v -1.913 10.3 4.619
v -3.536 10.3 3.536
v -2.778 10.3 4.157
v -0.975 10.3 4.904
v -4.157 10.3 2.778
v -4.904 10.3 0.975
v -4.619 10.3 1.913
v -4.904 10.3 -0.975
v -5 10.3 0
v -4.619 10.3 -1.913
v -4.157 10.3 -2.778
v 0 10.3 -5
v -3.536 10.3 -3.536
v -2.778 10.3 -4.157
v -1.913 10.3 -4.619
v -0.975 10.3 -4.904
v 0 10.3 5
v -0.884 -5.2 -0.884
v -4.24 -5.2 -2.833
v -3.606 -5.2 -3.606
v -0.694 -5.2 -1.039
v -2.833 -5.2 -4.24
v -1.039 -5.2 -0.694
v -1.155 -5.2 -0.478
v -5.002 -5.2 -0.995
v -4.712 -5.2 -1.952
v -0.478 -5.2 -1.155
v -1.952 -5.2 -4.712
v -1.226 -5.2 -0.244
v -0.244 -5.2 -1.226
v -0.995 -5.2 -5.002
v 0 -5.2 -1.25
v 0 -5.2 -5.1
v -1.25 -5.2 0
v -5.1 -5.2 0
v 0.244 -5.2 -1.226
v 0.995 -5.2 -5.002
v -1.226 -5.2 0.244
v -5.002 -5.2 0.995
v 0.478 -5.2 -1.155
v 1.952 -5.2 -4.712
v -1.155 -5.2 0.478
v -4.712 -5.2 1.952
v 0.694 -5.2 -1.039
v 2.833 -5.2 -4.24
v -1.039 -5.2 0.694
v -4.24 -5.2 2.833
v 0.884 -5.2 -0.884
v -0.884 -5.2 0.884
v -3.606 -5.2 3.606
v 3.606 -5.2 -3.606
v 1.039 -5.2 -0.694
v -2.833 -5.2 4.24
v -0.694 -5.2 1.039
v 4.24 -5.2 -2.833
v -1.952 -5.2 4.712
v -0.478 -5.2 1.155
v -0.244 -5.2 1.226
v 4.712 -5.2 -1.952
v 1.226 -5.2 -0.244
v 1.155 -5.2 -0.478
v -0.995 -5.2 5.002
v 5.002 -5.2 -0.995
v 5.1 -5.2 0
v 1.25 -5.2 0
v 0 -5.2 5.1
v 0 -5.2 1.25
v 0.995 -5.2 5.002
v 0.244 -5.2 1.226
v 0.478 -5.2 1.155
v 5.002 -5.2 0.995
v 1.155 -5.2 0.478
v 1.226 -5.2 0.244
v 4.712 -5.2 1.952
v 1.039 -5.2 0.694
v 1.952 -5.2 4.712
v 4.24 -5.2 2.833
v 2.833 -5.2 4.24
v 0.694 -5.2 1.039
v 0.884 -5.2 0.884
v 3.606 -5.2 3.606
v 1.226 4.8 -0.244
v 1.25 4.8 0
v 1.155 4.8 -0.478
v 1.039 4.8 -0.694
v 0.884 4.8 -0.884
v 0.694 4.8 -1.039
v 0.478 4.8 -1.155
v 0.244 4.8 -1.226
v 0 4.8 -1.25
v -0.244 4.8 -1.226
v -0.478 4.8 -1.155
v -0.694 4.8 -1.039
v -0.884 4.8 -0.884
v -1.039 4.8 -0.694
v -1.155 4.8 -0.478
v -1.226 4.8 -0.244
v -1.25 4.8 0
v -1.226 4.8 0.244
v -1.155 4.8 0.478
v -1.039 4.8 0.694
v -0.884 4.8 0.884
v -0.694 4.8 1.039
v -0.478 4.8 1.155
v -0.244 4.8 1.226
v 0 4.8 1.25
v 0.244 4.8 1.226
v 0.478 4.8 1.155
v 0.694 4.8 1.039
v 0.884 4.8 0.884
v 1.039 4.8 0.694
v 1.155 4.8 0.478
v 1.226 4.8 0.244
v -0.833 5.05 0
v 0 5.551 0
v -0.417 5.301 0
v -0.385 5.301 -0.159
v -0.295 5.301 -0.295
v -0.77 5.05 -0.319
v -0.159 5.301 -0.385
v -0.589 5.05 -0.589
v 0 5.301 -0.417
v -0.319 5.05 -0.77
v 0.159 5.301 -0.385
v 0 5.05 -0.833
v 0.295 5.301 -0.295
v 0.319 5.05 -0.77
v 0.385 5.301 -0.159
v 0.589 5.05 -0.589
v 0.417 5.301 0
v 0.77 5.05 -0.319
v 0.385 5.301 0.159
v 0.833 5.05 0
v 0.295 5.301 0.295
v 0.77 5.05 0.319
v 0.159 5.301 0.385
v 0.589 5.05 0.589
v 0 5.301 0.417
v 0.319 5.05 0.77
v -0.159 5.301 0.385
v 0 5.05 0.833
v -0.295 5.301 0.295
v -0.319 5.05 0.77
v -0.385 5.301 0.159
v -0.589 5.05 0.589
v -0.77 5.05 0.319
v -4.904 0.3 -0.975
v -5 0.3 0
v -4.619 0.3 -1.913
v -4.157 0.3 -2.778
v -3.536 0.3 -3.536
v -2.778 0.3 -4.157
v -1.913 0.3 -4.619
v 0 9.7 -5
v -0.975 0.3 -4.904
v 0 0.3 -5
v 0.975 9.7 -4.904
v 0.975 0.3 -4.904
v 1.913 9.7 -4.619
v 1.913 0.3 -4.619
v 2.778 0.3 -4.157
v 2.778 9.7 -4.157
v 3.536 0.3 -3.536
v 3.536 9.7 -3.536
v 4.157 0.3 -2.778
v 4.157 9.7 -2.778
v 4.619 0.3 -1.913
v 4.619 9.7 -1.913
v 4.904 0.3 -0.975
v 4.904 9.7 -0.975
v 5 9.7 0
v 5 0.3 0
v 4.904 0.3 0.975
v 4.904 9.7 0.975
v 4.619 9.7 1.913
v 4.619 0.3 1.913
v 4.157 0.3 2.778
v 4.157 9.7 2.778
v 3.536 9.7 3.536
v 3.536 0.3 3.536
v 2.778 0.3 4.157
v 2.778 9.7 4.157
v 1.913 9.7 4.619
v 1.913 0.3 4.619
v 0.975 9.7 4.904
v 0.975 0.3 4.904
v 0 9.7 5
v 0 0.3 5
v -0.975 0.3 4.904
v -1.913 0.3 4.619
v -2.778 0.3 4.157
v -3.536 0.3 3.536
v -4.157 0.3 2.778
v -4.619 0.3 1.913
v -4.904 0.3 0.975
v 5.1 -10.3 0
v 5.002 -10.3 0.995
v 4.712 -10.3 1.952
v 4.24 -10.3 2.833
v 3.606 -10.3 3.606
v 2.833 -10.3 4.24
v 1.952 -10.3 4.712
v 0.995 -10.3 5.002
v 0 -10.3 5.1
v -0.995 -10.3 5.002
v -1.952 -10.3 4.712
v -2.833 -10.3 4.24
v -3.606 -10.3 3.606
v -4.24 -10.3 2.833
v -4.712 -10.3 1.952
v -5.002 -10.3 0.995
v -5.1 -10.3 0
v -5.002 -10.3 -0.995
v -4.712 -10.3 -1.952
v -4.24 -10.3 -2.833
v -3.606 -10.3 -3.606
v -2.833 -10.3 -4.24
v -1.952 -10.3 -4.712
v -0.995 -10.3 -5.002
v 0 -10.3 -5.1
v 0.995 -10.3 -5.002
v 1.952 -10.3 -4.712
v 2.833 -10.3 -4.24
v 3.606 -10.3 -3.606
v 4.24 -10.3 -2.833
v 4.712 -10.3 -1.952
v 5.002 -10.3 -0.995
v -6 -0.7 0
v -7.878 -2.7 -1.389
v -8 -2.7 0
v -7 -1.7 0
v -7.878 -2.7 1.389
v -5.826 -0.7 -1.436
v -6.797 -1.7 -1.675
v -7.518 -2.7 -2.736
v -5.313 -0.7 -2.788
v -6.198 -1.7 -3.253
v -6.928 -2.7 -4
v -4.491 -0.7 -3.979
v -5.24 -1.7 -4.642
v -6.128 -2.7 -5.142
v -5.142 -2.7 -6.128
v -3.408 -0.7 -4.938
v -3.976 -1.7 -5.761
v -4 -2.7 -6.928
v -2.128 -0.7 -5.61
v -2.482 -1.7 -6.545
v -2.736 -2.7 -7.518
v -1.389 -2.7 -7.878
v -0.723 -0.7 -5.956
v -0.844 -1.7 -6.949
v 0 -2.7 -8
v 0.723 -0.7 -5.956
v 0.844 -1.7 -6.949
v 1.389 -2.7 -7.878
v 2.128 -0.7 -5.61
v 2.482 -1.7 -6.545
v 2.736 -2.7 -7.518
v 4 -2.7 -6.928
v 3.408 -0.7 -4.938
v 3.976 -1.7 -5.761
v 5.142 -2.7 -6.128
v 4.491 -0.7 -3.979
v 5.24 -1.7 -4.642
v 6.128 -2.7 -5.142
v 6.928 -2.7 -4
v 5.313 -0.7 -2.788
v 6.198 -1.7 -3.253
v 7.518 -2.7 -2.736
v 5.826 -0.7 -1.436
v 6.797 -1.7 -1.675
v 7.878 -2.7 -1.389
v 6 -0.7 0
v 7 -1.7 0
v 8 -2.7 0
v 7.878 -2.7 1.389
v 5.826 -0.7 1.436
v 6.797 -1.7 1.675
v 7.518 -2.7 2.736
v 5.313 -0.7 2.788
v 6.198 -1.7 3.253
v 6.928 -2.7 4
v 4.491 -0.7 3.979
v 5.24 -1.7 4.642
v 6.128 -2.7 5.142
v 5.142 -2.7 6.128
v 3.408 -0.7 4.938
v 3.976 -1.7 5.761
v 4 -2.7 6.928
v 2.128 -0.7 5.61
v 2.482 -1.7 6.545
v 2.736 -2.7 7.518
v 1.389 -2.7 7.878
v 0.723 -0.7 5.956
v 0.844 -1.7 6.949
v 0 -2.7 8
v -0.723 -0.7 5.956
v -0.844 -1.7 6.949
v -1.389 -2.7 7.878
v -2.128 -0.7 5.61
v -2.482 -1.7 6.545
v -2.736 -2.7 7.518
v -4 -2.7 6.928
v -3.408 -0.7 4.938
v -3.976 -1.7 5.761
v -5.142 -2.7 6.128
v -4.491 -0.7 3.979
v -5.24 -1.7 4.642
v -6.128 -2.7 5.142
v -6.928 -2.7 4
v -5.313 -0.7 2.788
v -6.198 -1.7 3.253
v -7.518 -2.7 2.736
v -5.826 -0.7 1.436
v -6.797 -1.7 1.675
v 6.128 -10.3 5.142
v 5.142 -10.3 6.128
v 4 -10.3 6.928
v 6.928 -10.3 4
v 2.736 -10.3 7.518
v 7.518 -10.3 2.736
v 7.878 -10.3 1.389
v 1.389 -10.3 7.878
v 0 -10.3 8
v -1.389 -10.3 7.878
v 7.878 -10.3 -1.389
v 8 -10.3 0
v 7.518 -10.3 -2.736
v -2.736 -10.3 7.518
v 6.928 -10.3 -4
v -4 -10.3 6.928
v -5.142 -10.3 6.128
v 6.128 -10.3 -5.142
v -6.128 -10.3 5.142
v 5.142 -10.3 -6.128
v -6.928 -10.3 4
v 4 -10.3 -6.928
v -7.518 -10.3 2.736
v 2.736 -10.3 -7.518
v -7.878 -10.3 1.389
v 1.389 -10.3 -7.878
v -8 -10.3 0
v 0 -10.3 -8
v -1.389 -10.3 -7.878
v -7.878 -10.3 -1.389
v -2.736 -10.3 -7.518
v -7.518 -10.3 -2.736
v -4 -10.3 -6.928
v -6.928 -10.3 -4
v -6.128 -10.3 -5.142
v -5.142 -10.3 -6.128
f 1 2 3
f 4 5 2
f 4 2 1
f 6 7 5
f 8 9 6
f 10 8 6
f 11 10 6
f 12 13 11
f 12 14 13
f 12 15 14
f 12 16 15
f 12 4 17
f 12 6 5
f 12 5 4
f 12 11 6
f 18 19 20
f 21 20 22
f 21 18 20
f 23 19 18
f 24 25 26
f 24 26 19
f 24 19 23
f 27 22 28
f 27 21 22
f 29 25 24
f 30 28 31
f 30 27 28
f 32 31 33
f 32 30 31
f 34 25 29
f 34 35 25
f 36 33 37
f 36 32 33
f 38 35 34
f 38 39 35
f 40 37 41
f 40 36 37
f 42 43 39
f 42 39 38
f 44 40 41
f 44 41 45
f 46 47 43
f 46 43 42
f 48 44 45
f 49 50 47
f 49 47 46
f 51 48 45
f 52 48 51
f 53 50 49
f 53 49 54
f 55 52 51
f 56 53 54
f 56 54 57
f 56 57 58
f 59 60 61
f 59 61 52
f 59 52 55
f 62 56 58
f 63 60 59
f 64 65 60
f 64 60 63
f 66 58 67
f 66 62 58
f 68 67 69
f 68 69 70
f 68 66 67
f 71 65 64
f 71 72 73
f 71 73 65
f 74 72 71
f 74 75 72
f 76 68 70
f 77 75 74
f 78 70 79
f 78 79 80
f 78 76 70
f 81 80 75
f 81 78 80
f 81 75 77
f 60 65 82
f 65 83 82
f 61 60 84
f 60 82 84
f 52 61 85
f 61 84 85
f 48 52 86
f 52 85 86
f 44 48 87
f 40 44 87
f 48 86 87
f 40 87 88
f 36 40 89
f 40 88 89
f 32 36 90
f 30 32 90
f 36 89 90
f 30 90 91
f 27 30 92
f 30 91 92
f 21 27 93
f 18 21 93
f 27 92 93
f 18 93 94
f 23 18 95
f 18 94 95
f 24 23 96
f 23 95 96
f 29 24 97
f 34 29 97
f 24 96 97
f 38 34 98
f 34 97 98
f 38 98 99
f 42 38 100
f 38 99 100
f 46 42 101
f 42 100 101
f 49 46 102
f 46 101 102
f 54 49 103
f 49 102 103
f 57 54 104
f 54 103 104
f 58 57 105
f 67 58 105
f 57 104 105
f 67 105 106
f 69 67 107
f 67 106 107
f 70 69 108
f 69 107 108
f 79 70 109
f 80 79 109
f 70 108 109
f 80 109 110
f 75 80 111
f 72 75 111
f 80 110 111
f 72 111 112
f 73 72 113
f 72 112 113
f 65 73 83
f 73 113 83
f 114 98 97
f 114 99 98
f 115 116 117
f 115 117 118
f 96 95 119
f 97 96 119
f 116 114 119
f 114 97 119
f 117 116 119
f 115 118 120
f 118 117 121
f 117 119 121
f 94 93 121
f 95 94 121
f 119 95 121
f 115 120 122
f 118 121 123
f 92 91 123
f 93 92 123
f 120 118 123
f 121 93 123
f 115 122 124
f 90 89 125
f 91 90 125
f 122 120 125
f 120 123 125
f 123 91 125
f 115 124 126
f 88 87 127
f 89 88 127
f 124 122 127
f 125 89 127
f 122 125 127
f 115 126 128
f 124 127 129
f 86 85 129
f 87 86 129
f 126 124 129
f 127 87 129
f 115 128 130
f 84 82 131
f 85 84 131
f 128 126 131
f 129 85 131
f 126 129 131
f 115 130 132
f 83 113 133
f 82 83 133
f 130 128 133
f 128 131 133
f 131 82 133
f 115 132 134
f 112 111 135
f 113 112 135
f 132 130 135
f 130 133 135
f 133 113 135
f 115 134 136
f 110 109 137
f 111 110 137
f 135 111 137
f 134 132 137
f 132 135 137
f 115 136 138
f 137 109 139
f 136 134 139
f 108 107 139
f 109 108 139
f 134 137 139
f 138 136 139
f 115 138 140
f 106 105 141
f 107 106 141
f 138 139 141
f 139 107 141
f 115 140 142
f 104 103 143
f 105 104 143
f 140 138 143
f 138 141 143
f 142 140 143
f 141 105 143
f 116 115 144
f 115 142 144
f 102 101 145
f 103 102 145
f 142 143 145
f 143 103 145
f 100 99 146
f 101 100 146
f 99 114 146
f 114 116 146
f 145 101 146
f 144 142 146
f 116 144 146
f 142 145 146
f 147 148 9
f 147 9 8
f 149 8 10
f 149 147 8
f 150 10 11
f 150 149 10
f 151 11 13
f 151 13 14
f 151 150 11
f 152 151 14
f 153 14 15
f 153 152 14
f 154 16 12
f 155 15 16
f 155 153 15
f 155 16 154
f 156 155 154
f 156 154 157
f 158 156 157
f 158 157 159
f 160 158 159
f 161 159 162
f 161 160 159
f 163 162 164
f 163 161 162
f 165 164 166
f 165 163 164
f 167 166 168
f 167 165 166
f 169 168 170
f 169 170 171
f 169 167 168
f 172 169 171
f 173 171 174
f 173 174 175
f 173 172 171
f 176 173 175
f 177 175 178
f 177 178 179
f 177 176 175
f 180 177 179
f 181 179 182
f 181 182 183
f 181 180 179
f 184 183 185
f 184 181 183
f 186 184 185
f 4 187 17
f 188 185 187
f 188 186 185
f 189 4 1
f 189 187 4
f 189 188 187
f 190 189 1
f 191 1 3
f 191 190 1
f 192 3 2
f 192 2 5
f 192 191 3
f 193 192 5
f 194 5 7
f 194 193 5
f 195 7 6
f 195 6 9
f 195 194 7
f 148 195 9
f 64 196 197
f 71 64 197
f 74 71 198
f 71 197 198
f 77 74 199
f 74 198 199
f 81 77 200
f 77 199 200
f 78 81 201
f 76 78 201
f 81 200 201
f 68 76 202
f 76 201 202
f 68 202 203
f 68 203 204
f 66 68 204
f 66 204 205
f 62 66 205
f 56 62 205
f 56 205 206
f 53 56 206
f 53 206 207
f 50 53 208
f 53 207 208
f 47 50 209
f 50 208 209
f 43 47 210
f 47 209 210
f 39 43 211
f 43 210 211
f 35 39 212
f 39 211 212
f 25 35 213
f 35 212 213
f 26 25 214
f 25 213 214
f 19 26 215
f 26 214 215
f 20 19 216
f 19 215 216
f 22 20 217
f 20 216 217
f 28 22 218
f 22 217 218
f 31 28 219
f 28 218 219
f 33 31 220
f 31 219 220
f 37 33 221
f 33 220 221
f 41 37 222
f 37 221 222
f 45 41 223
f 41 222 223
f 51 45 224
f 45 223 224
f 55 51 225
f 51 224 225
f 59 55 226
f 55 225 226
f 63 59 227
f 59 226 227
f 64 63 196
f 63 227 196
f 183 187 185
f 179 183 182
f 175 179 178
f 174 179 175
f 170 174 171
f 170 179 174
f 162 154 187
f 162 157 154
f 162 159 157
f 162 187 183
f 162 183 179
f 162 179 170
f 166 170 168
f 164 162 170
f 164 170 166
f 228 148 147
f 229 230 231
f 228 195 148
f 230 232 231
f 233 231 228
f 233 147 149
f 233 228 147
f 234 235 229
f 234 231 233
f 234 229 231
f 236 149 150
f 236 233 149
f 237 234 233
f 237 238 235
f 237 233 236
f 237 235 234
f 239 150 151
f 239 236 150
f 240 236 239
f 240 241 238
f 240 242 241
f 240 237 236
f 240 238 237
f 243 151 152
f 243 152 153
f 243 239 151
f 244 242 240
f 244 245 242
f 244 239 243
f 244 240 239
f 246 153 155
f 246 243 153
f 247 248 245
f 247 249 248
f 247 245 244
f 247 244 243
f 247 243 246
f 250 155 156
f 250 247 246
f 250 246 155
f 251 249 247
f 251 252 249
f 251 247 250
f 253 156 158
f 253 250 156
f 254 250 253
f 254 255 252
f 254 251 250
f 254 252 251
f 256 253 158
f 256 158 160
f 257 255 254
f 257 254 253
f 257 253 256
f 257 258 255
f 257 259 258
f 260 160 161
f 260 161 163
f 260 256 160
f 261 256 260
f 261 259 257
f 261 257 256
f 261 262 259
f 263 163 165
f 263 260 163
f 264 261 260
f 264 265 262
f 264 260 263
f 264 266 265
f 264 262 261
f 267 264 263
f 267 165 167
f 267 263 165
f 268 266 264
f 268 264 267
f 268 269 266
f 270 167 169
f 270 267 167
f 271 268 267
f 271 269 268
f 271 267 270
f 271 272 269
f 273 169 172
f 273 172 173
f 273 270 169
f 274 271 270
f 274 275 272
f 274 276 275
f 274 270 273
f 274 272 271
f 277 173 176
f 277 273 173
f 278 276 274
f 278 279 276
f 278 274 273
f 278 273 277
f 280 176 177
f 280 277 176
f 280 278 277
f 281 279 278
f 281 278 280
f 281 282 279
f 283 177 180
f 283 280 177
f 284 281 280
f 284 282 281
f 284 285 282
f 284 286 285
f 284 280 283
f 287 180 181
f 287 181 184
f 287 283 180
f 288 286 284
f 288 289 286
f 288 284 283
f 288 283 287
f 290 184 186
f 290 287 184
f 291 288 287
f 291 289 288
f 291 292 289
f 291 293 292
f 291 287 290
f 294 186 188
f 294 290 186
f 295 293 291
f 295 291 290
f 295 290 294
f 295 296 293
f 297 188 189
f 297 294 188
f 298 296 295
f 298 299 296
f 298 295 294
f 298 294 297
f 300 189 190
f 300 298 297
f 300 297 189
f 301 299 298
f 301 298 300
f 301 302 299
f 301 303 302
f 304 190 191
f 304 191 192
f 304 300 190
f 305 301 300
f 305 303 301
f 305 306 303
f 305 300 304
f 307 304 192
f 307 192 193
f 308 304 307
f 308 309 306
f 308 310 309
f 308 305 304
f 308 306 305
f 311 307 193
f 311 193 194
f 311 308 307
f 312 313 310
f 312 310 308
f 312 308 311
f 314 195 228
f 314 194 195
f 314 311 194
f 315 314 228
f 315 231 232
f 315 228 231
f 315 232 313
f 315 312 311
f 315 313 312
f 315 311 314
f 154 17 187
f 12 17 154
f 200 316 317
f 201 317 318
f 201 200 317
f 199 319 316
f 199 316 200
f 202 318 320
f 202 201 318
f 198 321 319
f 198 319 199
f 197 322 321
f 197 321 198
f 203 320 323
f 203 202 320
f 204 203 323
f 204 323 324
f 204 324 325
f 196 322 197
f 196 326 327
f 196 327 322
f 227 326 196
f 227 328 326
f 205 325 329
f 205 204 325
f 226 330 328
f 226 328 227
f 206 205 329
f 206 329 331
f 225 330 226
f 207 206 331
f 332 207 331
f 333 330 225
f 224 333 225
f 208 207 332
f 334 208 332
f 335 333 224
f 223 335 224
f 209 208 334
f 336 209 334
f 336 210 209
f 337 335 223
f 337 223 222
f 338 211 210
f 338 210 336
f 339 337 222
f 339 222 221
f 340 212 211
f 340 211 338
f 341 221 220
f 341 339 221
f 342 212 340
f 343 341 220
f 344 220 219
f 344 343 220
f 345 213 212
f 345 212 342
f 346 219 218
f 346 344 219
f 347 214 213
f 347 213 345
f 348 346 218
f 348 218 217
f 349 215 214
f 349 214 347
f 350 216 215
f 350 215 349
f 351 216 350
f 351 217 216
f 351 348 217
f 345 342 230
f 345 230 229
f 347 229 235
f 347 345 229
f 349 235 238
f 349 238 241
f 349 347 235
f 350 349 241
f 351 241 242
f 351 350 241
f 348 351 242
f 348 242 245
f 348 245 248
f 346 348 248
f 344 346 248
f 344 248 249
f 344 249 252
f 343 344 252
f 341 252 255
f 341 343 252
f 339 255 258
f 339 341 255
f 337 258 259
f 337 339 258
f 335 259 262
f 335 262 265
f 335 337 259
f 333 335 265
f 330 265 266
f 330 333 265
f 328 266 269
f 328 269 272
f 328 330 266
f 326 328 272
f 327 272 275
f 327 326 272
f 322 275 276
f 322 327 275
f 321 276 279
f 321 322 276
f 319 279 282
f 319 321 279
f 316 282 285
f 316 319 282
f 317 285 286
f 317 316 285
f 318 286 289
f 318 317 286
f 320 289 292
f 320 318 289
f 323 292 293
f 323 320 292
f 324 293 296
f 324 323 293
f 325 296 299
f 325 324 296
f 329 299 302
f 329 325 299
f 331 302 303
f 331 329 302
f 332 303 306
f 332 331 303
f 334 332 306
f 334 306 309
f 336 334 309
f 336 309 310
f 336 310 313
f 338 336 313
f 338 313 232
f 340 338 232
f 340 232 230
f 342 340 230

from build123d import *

# Parameters (mm, degrees)
SKETCH_4_W             = 5
SKETCH_4_H             = 10
CUT_EXTRUDE_849_DEPTH  = 0.6
CHAMFER_1_SIZE         = 3
SKETCH_5_R             = 5.1
CUT_EXTRUDE_1019_DEPTH = 5.1
HOLE_WIZARD_M3_D       = 2.5
HOLE_WIZARD_M3_DEPTH   = 10
HOLE_WIZARD_M3_TIP     = 0.751075774


with BuildPart() as part:
    # Эскиз1 → Revolve 497 (revolve)
    with BuildSketch(Plane.XY):
        Polygon((0, 10.3), (-5, 10.3), (-5, 0.3), (-8, 0.3), (-8, -10.3), (0, -10.3), align=None)
    revolve(axis=Axis((0, 10.3, 0), (0, -1, 0)))

    # Эскиз4 → Cut-Extrude 849 (cut)
    with BuildSketch(Plane(origin=(0, 10.3, 0), x_dir=(1, 0, 0), z_dir=(0, 1, 0))):
        with Locations((2.5, 0)):
            Rectangle(SKETCH_4_W, SKETCH_4_H)
    extrude(amount=-CUT_EXTRUDE_849_DEPTH, mode=Mode.SUBTRACT)

    # Фаска1
    chamfer_1_edges = [part.edges().sort_by_distance(p)[0] for p in [
        (8, 0.3, 0),
    ]]
    chamfer(chamfer_1_edges, length=CHAMFER_1_SIZE - 0.0001)  # a hair under: the kernel refuses the full size

    # Эскиз5 → Cut-Extrude 1019 (cut)
    with BuildSketch(Plane.XZ.offset(10.3)):
        Circle(SKETCH_5_R)
    extrude(amount=-CUT_EXTRUDE_1019_DEPTH, mode=Mode.SUBTRACT)

    # Крепление магнита M3
    with Locations(Plane(origin=(0, -5.2, 0), x_dir=(-1, 0, 0), z_dir=(0, -1, 0))):
        with Locations((0, 0)):
            Hole(HOLE_WIZARD_M3_D / 2, depth=HOLE_WIZARD_M3_DEPTH)
            with Locations((0, 0, -(HOLE_WIZARD_M3_DEPTH + HOLE_WIZARD_M3_TIP / 2))):  # 118° drill point
                Cone(0, HOLE_WIZARD_M3_D / 2, HOLE_WIZARD_M3_TIP, mode=Mode.SUBTRACT)


solid = part.part
